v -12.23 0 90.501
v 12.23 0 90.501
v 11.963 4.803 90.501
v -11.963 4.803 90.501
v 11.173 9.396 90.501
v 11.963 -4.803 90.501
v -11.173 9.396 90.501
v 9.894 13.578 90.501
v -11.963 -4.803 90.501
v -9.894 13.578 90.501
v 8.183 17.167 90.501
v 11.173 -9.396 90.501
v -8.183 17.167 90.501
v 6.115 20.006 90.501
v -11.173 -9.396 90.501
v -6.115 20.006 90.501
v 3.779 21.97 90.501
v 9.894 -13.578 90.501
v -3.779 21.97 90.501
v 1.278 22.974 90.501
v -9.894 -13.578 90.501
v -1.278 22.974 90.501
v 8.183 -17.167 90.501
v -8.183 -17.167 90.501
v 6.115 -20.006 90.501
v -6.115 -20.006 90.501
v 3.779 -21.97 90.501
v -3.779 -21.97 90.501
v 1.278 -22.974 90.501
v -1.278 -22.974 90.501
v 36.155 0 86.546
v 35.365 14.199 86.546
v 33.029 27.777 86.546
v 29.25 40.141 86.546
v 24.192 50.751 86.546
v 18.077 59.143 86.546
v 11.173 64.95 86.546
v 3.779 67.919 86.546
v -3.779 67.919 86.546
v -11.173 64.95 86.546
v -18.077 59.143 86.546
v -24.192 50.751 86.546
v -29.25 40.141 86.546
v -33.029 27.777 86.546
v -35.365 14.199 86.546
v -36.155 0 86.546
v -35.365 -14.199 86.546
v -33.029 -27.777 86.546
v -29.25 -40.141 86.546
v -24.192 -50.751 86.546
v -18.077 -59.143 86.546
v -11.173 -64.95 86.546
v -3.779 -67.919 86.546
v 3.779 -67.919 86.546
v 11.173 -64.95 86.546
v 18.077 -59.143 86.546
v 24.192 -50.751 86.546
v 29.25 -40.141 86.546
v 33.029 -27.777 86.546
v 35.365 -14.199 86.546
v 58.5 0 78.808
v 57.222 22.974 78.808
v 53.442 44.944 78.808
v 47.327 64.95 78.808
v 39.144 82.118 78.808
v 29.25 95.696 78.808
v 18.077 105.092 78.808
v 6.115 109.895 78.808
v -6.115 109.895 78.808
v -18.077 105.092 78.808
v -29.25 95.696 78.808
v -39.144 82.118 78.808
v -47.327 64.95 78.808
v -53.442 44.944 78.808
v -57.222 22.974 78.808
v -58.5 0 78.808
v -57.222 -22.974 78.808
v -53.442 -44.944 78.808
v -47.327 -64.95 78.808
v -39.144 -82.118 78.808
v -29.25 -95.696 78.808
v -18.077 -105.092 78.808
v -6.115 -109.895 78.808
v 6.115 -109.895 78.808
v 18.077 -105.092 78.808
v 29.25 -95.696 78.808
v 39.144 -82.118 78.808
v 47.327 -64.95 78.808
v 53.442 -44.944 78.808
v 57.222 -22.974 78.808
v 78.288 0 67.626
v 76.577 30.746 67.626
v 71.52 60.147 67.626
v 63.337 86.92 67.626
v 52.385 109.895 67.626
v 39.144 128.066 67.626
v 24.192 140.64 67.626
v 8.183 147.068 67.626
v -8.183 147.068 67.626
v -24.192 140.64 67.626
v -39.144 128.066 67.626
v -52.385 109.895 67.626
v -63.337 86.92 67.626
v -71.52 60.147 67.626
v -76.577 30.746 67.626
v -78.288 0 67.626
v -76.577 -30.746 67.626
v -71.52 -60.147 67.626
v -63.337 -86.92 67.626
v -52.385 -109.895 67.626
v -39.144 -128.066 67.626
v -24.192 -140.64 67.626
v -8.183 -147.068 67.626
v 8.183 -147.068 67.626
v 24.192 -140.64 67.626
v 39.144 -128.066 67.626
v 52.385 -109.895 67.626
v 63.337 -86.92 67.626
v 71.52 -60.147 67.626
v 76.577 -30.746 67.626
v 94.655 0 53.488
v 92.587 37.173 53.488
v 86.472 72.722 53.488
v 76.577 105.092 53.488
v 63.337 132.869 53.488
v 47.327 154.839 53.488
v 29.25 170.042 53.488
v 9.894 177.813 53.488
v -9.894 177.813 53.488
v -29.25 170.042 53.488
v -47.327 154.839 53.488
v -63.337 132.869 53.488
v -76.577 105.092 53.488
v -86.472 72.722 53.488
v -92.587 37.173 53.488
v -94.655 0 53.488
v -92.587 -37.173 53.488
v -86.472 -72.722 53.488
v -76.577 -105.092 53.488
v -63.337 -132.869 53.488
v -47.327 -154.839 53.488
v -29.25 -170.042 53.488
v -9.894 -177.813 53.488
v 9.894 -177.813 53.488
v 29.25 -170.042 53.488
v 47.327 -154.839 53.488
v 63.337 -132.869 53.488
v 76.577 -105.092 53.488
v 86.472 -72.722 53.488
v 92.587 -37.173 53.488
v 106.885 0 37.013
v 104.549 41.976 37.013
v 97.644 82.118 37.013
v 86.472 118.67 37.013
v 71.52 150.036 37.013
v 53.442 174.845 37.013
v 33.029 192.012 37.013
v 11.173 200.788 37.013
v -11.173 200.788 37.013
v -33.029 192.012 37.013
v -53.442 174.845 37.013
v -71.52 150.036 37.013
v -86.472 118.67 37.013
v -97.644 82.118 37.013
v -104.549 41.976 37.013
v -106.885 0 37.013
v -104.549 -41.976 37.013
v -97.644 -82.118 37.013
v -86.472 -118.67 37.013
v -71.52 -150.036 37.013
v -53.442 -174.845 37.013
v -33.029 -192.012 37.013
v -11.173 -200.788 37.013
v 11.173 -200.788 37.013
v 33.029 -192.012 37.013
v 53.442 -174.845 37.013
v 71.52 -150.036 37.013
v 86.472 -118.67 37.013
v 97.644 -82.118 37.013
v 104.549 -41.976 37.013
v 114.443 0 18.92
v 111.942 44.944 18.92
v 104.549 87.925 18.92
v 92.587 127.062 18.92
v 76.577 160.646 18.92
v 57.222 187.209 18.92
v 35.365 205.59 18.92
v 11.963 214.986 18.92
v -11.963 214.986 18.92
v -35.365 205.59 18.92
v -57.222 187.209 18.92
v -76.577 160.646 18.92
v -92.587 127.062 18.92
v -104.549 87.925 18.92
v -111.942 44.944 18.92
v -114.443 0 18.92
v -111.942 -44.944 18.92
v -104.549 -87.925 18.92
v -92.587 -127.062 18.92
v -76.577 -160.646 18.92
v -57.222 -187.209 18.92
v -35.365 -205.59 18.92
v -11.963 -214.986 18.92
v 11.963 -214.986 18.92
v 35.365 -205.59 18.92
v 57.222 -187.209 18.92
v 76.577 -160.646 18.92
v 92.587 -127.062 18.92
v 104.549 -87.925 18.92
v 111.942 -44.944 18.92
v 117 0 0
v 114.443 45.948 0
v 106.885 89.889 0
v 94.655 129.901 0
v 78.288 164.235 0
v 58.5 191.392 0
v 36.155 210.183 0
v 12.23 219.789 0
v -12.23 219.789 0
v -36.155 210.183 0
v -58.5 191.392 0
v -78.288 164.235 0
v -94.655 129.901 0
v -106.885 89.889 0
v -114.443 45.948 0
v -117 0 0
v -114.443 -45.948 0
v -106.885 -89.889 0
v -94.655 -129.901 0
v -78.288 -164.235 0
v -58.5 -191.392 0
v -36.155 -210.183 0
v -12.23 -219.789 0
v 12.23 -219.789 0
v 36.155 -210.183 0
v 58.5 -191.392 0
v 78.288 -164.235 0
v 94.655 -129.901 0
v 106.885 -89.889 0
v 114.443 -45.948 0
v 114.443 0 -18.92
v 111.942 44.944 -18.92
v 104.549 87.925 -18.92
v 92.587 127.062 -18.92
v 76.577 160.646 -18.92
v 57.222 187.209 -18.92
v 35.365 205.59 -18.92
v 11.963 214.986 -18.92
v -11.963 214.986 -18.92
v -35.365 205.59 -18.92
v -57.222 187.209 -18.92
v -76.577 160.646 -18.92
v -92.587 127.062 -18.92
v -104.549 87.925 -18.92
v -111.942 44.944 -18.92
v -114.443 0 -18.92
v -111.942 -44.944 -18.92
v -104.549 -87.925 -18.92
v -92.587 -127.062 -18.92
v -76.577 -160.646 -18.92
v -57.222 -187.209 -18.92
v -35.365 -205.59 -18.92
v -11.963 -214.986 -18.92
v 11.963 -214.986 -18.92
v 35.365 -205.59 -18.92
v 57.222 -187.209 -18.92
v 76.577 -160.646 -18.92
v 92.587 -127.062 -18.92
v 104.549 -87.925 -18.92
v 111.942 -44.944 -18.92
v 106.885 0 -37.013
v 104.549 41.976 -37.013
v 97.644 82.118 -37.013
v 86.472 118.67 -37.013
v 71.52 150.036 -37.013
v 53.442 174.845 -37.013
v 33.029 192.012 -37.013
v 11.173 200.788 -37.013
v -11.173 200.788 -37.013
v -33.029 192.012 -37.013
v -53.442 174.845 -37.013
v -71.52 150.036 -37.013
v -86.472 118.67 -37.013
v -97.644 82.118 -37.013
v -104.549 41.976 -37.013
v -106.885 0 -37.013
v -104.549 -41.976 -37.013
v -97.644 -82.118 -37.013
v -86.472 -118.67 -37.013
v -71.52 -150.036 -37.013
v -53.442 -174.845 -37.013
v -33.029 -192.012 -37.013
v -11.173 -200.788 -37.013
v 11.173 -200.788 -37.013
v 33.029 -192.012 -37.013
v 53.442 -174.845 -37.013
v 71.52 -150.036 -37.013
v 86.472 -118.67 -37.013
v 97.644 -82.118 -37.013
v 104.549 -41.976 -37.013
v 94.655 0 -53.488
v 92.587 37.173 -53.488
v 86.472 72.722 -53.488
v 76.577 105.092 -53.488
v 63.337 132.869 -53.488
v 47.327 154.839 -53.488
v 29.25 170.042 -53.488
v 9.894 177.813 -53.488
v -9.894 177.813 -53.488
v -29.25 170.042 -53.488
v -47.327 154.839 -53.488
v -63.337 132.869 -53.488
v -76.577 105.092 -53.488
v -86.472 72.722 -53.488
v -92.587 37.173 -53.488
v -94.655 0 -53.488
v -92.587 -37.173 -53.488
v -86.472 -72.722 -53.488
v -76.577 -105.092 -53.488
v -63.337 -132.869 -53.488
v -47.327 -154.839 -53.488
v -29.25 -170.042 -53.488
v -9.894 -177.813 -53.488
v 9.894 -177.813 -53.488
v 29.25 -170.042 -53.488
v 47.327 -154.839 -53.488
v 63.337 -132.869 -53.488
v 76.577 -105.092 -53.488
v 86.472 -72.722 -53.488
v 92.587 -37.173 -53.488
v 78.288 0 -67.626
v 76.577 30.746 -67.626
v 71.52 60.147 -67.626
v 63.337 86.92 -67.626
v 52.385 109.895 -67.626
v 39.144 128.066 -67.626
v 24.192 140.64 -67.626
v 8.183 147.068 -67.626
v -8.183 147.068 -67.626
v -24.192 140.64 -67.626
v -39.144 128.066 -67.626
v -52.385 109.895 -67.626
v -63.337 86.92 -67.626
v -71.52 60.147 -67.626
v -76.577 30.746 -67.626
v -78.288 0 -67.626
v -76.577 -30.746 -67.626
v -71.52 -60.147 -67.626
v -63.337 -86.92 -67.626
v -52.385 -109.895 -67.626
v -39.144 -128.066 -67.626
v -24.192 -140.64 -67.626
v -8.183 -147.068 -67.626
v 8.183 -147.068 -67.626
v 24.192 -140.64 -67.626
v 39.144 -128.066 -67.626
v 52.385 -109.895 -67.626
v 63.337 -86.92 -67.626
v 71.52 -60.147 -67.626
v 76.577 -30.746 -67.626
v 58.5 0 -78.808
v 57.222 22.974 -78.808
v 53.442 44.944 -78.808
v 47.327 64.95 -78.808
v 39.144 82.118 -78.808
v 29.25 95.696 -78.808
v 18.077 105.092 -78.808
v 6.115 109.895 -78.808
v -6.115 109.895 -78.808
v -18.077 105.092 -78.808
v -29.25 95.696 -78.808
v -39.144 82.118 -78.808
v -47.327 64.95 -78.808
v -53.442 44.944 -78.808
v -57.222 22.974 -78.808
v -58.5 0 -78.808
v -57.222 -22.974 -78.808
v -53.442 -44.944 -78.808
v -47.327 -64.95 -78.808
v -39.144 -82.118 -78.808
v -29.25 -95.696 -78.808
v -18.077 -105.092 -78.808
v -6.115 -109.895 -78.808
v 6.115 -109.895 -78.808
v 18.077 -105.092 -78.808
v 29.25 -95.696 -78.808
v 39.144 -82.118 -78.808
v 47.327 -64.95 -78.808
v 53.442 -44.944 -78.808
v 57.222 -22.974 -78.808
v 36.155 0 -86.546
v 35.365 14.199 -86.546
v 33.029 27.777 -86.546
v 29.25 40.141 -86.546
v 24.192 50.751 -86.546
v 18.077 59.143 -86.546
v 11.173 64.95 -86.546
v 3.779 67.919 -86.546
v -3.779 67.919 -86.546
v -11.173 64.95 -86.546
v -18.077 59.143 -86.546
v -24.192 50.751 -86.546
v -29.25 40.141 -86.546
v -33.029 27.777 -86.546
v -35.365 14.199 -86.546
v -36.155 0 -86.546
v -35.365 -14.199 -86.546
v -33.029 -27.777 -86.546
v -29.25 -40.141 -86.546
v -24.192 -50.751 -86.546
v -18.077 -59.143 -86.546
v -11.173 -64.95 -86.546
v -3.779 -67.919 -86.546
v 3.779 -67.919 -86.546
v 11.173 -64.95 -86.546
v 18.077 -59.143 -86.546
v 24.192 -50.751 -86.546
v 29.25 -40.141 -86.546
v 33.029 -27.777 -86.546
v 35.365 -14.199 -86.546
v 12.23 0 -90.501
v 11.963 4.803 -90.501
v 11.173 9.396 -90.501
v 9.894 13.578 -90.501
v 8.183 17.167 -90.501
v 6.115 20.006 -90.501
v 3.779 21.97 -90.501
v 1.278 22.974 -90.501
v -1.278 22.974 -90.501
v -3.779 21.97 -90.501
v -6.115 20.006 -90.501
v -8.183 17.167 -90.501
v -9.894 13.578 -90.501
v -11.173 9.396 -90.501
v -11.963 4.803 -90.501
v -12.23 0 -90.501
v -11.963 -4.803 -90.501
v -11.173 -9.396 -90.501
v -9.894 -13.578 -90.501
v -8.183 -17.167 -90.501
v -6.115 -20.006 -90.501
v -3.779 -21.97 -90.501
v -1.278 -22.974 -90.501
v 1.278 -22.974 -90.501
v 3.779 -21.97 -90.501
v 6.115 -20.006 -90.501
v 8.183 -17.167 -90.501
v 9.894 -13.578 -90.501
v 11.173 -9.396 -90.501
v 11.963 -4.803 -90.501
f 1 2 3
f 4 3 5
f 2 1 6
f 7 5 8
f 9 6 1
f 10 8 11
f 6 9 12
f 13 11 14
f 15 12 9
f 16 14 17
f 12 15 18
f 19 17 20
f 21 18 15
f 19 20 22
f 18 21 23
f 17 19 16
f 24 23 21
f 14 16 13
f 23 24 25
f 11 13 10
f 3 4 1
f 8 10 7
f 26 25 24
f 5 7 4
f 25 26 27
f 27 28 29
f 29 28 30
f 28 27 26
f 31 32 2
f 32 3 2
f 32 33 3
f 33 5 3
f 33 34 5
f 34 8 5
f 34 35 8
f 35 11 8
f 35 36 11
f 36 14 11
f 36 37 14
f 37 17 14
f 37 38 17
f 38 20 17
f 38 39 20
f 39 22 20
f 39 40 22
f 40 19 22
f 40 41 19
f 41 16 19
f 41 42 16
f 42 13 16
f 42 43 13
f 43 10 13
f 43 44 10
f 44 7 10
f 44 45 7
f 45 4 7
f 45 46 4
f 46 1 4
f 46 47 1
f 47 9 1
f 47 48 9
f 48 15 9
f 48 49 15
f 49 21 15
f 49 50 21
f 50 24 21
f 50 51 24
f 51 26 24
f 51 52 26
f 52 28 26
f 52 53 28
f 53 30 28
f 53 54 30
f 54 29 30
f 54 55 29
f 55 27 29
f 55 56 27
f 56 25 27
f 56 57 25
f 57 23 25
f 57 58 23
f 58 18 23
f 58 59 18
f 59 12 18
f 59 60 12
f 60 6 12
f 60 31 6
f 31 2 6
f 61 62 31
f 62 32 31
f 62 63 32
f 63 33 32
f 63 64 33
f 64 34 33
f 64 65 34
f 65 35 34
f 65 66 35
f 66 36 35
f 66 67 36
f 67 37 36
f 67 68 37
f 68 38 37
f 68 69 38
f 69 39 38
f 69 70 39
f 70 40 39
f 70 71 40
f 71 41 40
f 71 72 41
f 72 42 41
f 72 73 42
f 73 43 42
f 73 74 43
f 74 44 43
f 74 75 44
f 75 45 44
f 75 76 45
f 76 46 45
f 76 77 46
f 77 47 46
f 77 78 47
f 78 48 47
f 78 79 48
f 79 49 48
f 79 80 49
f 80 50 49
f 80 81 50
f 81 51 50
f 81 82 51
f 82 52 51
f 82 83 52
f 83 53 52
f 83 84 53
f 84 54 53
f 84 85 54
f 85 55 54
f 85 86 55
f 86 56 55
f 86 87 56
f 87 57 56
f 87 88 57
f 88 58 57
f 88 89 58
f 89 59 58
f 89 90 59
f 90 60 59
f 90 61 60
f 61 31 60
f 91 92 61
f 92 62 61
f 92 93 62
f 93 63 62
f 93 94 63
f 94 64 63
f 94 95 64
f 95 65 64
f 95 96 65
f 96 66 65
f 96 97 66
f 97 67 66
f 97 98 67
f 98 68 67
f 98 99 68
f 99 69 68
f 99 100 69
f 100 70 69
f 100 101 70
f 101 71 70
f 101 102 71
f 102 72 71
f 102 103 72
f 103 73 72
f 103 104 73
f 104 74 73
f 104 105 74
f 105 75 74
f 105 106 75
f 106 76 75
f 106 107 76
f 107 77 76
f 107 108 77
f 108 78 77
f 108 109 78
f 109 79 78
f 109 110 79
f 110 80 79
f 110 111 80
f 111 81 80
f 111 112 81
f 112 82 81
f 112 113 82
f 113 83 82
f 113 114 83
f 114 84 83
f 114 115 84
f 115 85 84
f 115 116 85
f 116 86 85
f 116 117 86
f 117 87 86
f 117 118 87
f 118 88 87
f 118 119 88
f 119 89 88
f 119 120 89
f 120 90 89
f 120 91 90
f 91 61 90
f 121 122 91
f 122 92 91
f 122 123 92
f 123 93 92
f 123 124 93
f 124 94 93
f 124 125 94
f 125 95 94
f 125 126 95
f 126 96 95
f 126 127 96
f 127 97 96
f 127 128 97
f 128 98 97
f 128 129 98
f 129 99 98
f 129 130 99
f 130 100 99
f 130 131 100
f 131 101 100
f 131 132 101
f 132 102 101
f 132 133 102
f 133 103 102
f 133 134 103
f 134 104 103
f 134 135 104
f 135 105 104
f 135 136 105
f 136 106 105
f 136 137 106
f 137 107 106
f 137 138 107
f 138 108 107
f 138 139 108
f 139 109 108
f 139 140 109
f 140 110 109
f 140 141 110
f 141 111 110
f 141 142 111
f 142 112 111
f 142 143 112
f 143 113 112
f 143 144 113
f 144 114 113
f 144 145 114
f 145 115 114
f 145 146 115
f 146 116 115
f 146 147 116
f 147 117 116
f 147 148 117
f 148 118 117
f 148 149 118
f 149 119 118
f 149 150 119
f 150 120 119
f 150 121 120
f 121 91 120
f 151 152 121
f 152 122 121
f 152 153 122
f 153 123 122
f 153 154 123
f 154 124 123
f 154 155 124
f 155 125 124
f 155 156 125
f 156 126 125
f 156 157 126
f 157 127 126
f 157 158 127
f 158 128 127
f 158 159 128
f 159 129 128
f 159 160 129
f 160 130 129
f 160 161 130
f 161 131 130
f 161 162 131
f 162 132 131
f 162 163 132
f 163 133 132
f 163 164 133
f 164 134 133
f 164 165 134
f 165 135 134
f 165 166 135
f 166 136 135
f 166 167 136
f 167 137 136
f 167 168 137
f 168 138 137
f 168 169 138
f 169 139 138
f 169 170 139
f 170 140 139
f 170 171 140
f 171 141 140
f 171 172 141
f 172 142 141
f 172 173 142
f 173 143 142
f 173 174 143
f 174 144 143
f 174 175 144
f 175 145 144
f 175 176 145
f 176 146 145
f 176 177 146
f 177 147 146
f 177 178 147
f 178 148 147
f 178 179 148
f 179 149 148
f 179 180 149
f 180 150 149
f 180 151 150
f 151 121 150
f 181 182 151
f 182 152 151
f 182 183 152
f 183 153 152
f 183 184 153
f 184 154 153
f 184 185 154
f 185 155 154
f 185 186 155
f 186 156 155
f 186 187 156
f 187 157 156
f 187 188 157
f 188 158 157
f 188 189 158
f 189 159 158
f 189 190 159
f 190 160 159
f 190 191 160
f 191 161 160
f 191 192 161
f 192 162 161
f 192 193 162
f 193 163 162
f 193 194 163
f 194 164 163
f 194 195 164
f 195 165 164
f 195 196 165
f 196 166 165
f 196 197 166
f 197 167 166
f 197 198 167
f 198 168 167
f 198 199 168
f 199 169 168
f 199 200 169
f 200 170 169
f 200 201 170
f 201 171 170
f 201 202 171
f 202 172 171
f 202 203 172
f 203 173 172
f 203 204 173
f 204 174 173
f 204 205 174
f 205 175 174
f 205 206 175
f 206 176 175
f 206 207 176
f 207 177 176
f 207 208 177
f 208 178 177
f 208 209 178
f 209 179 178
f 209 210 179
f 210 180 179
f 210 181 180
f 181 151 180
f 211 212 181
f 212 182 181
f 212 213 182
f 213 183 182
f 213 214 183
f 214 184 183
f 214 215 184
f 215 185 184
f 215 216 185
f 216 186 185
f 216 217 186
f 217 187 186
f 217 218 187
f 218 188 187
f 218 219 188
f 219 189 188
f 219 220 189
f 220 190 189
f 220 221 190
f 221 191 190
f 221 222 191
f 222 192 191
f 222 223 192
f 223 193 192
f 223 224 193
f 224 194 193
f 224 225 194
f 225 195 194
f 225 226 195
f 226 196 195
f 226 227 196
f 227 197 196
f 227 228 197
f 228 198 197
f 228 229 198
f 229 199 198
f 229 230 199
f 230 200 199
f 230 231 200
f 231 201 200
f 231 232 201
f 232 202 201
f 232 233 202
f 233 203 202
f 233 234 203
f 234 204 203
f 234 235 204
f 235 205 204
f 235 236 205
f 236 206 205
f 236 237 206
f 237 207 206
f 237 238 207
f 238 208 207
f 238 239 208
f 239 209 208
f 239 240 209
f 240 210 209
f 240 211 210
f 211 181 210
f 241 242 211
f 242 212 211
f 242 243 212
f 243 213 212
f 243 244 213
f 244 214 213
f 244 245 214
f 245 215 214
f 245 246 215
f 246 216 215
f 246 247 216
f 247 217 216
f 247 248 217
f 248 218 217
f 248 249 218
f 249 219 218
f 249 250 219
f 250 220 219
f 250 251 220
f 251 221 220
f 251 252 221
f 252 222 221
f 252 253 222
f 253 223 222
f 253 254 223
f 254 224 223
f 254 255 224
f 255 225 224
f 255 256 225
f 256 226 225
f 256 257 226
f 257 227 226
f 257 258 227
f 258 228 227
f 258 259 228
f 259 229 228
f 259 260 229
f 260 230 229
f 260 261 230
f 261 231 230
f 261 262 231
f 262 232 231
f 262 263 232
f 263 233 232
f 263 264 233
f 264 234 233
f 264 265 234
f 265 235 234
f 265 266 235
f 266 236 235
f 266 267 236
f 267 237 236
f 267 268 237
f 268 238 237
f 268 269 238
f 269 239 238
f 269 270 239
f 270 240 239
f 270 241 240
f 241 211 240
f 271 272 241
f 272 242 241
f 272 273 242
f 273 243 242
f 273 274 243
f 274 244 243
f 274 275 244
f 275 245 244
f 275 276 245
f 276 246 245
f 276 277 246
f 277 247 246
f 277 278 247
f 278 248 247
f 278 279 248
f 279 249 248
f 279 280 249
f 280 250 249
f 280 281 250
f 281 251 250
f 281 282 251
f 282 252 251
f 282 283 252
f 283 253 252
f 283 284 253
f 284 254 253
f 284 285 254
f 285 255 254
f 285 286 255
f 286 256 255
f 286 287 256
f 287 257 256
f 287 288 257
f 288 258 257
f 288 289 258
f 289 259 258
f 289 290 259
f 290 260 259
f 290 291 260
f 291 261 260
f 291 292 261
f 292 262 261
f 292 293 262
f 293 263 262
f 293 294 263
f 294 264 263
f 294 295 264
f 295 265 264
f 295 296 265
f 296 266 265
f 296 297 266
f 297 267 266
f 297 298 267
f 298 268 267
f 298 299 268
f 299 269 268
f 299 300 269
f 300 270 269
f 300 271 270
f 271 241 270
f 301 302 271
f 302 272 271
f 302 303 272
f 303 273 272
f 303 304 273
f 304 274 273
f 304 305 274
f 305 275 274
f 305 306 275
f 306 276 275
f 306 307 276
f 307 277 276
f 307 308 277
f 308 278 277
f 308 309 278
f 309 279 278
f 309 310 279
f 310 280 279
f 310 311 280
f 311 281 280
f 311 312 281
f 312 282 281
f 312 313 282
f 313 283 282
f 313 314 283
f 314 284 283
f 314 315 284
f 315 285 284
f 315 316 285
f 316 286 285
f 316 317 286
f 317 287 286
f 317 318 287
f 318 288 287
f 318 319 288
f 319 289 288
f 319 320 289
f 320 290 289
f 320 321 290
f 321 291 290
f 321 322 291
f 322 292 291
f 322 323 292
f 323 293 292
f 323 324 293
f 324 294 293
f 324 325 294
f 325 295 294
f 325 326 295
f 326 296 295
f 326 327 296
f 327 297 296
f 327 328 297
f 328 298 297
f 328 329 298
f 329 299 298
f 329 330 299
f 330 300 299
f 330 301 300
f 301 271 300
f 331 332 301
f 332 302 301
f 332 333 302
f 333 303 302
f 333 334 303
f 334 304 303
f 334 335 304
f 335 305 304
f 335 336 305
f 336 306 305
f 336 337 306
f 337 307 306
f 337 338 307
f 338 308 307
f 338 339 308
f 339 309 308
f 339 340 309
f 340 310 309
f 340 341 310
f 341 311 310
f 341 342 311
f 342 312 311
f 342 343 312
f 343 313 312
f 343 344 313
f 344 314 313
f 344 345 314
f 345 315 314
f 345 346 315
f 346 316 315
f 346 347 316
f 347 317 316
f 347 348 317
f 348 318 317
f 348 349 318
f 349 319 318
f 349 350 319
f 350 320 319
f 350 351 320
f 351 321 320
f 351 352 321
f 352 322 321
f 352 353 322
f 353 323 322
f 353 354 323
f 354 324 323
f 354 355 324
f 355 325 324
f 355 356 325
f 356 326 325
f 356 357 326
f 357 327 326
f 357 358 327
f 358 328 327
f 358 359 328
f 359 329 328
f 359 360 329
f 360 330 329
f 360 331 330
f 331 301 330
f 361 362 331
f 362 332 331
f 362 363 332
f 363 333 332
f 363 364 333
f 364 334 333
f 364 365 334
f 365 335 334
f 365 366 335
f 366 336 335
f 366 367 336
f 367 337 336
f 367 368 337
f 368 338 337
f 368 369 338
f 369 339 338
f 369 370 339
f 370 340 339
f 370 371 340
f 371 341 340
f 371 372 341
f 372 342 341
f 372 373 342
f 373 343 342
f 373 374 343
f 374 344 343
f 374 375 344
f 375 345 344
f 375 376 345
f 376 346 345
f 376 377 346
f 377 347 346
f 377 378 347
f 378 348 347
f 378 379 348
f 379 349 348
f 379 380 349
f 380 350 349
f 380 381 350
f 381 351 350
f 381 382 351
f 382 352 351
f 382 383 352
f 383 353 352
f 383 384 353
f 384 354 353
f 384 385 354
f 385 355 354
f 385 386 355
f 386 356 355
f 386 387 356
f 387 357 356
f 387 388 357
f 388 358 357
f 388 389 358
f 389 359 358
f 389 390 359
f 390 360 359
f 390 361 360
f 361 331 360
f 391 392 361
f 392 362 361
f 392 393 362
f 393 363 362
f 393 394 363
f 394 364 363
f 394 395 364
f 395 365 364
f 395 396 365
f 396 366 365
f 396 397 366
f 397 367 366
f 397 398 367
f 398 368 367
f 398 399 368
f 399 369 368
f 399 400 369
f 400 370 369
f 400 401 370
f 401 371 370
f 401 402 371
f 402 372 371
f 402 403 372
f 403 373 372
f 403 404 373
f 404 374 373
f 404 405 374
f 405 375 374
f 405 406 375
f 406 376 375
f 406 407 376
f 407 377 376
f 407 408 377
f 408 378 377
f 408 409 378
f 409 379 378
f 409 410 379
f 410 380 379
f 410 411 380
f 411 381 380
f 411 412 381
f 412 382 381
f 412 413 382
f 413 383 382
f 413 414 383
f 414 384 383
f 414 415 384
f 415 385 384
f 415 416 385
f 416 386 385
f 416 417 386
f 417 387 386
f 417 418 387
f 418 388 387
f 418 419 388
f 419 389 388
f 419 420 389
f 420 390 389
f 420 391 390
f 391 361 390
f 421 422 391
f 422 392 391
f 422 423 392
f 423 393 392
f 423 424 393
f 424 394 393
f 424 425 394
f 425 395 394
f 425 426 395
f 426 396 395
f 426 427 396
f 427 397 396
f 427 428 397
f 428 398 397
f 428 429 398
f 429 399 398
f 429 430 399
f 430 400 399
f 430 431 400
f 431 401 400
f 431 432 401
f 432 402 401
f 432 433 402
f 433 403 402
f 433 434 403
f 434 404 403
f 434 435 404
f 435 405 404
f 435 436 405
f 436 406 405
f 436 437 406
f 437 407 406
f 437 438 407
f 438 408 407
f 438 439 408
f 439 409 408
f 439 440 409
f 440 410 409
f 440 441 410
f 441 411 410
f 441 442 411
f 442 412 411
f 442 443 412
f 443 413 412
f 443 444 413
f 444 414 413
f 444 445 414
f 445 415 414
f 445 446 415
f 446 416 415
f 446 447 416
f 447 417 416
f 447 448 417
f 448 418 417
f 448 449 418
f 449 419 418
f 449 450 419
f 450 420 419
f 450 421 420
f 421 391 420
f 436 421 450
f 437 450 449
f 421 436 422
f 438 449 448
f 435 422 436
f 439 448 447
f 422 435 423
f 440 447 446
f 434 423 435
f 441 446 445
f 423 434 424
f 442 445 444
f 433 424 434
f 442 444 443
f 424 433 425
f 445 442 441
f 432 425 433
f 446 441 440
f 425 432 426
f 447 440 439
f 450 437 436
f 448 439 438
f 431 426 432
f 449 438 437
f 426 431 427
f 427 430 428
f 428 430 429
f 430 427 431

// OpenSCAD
// Generated by SolidPython 1.0.1 on 2020-07-29 00:46:49


scale(v = [9, 17, 7]) {
	sphere(r = 13);
}
/***********************************************
*********      SolidPython code:      **********
************************************************
 
# import packages: SolidPython
from solid import *
from solid.utils import *
from itertools import chain, combinations, permutations


class Resize:

    def __init__(self, scad_file):
        self.scad_file = scad_file
        #self.scad_file = import_scad(scad_file)
        # cone/cylinder param:
        self.r1 = 0
        self.r2 = 0
        self.h = 0
        # rectangular prism param:
        self.w = 0
        self.l = 0
        # ellipse param:
        self.r = 0

    # import OpenScad code (file name corresponds to shape)


    # classify shape + parameters
    def assign(self, param1, param2, param3):
        if self.scad_file == 'cone.scad':
            self.r1 = param1
            self.r2 = param2
            self.h = param3
        elif self.scad_file == 'cylinder.scad':
            self.r1 = param1
            self.r2 = param2
            self.h = param3
        elif self.scad_file == 'rectangularPrism.scad':
            self.h = param1
            self.l = param2
            self.w = param3
        else:
            self.r = param1
            self.h = param2

    # resize parameters
    def iterate(self):
        x = range(3, 20, 2)
        i = 1
        if self.scad_file == 'cone.scad':
            tempList = list(permutations(x, 2))
            for temp in tempList:
                param1 = temp[0]
                param2 = temp[1]
                filepath = 'produced_scad_files/' + 'cone' + str(param1) + '_' + str(param2) + '_' + '.scad'
                scad_render_to_file(cylinder(h=param1, r1=param2, r2=0), filepath)

        elif self.scad_file == 'cylinder.scad':
            tempList = list(permutations(x, 3))
            for temp in tempList:
                param1 = temp[0]
                param2 = temp[1]
                filepath = 'produced_scad_files/' + 'cylinder' + str(param1) + '_' + str(param2) + '_' + '.scad'
                scad_render_to_file(cylinder(h=param1, r1=param2, r2=param2), filepath)

        elif self.scad_file == 'rectangularPrism.scad':
            tempList = list(permutations(x, 3))
            for temp in tempList:
                param1 = temp[0]
                param2 = temp[1]
                param3 = temp[2]
                filepath = 'produced_scad_files/' + 'rectangularPrism' + str(param1) + '_' + str(param2) + '_' + str(
                    param3) + '.scad'
                scad_render_to_file(cube(size=(param1, param2, param3)), filepath)

        elif self.scad_file == 'ellipse.scad':
            tempList = list(permutations(x, 4))
            for temp in tempList:
                param1 = temp[0]
                param2 = temp[1]
                param3 = temp[2]
                param4 = temp[3]
                filepath = 'produced_scad_files/' + 'ellipse' + str(param1) + '_' + str(param2) + '_' + str(param3) + '_' + str(param4) + '.scad'
                scad_render_to_file(scale([param1, param2, param3])(sphere(r=param4)), filepath)

    def render_to_scadfile(self):
        scad_render_to_file(scad, 'example.scad') 
 
************************************************/
